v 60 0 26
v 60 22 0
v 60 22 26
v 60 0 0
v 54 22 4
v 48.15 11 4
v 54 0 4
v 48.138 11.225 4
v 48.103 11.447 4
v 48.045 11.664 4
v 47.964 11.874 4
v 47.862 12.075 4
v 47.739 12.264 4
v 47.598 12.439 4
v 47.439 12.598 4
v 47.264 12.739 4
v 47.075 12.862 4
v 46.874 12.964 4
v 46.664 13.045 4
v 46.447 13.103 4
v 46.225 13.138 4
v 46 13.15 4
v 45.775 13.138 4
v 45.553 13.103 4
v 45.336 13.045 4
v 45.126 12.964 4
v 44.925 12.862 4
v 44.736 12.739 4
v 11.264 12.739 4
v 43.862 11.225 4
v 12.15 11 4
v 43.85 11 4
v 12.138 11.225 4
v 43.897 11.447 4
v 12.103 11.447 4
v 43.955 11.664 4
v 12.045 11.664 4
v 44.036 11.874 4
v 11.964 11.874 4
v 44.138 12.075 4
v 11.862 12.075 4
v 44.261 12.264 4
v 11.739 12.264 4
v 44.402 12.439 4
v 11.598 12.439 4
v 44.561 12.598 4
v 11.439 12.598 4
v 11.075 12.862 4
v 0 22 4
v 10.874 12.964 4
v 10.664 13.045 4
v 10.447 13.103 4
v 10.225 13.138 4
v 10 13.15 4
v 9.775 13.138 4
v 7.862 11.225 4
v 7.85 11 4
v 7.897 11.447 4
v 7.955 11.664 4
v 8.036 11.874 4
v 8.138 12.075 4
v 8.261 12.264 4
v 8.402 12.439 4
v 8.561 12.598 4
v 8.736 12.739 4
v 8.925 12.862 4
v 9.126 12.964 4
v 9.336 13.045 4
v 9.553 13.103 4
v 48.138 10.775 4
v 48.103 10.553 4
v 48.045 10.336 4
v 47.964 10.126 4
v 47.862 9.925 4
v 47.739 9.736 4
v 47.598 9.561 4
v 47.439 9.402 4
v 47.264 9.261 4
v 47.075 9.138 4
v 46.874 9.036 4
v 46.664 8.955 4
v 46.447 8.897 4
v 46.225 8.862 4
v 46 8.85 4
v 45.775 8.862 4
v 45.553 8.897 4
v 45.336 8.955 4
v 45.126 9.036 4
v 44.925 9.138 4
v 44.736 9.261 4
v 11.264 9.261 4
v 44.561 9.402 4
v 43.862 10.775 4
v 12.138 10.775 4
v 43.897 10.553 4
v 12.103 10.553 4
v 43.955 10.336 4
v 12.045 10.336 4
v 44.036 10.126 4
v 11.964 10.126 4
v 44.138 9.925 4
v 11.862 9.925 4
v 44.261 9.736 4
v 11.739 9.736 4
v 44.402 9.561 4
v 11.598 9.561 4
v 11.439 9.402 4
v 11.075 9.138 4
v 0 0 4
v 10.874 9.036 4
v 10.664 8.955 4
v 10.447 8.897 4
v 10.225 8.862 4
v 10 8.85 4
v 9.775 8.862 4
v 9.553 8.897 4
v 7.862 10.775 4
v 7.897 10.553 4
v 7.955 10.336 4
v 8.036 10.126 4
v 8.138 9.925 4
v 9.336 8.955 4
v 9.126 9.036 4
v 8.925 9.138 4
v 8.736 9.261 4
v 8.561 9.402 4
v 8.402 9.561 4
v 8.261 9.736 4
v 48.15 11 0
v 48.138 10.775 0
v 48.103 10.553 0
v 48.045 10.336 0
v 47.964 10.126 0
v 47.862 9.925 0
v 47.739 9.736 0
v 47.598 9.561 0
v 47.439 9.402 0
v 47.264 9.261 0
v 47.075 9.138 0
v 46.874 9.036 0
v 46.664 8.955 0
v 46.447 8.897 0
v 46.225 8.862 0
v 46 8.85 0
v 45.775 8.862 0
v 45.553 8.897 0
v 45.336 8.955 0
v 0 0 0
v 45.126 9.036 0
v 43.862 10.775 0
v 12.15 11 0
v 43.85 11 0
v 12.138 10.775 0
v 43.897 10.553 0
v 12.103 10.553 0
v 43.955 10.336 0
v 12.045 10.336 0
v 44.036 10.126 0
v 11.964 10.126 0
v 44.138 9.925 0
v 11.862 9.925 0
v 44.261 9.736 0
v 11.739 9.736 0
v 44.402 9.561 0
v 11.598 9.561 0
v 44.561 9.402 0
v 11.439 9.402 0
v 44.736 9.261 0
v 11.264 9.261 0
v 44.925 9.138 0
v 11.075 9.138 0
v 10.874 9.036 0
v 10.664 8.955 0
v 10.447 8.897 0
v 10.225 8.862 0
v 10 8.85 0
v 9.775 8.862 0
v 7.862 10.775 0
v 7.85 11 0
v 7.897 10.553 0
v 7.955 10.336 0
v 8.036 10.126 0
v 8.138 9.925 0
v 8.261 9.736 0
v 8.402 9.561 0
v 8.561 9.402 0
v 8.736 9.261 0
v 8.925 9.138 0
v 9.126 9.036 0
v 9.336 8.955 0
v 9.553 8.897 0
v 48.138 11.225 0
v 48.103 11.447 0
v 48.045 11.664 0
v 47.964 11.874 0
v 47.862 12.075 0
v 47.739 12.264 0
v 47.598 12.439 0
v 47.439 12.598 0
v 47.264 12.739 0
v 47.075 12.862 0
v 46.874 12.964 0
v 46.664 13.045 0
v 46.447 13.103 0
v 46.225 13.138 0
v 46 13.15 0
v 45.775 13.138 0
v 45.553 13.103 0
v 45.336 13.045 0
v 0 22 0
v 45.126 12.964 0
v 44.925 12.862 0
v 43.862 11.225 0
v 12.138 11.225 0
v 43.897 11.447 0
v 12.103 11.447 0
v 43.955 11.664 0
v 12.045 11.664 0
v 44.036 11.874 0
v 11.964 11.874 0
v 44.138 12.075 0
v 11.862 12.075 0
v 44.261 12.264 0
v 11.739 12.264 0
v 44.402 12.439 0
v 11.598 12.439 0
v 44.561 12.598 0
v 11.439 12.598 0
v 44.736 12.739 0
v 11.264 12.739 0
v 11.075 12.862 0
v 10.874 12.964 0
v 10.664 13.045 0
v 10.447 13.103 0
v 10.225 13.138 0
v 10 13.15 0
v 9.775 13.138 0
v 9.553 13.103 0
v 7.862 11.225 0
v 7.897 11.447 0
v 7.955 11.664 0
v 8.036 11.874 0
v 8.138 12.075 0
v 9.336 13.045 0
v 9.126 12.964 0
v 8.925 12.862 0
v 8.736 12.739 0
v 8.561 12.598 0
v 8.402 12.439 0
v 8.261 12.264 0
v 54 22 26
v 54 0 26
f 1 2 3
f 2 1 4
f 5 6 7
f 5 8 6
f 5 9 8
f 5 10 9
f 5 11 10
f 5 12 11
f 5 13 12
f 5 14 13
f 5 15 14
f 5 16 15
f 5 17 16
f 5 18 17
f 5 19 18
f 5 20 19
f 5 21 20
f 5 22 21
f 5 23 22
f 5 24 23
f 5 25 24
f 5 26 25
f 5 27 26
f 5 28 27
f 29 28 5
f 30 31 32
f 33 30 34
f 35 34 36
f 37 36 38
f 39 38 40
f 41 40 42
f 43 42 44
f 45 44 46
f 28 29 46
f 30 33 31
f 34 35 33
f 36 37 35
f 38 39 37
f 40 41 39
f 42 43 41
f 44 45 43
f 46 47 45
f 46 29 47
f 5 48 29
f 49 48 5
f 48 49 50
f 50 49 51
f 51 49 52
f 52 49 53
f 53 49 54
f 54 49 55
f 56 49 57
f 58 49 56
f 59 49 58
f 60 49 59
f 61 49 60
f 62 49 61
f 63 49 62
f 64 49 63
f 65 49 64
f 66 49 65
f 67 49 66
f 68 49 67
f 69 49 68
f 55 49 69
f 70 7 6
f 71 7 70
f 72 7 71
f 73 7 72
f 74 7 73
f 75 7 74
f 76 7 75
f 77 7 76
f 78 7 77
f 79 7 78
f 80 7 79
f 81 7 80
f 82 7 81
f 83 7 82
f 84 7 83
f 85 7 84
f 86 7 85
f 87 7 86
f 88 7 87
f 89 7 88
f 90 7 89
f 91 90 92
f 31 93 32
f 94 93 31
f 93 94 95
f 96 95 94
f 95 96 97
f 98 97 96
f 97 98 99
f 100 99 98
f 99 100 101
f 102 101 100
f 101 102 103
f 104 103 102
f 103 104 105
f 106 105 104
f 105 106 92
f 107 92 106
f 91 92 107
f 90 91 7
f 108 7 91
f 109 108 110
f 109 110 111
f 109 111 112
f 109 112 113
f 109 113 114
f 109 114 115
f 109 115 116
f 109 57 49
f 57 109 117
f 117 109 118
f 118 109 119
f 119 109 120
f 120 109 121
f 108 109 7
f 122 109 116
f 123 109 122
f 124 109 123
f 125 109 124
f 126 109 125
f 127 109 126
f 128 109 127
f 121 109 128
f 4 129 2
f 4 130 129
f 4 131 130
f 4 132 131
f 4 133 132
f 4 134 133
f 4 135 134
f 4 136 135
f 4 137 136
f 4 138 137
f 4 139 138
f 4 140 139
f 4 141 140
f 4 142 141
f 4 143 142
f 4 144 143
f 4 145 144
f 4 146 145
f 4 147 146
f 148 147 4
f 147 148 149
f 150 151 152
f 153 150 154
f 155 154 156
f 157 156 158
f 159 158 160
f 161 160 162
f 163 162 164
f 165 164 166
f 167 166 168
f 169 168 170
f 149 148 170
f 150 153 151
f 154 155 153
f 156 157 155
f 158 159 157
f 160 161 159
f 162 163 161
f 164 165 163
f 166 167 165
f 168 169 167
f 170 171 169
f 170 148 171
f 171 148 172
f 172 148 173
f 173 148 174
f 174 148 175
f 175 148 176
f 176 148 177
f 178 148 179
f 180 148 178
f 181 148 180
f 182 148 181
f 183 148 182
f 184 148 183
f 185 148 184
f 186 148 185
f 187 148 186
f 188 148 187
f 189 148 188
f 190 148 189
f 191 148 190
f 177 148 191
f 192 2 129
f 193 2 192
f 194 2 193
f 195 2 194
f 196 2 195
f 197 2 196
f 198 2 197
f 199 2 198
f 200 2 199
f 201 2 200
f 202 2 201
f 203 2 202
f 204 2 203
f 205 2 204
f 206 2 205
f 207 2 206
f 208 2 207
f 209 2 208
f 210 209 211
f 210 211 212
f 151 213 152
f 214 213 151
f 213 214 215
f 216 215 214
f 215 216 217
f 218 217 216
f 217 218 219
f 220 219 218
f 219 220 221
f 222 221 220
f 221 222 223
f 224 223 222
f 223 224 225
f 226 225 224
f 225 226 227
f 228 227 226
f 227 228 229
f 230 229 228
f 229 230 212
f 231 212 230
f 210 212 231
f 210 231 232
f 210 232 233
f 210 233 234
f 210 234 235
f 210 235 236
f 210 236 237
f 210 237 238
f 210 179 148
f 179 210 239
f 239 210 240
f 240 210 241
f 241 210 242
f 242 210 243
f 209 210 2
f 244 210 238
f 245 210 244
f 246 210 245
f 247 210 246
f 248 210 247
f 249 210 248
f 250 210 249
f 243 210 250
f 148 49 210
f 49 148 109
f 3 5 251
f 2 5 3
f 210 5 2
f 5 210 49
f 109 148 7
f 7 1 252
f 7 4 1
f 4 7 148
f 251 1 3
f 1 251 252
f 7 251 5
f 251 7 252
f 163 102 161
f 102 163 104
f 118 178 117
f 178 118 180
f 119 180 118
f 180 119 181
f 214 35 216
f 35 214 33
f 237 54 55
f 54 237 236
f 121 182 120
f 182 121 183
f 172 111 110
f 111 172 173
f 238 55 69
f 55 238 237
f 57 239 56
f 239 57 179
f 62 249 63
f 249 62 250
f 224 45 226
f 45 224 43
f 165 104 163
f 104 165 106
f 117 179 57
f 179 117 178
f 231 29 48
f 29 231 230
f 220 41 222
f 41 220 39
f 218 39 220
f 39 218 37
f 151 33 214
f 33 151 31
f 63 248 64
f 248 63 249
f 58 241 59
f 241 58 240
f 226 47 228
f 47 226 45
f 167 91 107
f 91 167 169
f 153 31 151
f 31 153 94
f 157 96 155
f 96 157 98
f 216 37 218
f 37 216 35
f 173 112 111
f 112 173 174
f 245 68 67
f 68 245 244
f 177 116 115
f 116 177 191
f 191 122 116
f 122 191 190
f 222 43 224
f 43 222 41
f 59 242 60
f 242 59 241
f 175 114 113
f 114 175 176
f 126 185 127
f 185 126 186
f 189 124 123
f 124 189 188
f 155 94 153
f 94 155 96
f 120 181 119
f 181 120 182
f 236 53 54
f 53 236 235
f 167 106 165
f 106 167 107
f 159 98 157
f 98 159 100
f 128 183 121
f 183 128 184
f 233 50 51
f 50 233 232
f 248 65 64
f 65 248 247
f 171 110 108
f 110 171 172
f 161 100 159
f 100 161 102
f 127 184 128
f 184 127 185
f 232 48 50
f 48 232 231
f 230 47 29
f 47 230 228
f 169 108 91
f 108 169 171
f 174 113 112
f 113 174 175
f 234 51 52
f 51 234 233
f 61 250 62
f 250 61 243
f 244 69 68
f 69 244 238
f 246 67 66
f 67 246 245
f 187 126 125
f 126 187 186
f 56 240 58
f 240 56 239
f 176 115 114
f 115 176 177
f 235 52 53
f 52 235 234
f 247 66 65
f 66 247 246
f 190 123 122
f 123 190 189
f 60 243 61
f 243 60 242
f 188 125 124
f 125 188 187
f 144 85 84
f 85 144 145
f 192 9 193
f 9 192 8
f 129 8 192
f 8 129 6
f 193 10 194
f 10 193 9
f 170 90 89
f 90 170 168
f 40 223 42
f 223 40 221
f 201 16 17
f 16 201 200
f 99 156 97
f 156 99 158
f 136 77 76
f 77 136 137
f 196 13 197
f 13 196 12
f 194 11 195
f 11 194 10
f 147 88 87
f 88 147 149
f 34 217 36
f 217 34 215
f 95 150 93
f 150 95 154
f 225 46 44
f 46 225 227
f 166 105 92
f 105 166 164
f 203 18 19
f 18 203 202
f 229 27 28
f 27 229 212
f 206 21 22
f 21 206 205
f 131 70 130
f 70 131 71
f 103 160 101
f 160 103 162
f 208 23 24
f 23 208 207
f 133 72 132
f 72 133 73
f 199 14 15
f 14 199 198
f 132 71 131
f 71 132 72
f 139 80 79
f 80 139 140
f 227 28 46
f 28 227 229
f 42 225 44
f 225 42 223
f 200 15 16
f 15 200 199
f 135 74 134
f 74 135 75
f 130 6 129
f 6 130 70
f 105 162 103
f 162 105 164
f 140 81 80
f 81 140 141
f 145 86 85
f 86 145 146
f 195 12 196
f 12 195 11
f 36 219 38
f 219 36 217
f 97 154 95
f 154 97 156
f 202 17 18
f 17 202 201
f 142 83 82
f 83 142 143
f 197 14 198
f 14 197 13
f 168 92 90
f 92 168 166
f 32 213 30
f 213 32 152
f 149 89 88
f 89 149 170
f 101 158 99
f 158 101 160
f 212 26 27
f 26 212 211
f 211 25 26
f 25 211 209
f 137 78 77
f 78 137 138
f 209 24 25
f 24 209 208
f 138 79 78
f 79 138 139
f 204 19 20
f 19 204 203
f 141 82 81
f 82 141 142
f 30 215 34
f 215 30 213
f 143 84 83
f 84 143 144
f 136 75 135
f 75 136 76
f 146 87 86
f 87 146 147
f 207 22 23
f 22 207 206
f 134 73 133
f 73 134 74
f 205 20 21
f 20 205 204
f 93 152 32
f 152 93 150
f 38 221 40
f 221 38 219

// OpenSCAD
// Latch catch plate.
$fn = 60;
eps = 0.02;
length = 60;
height = 22;
width = 22;
thickness = 4;
difference() {
    union() { cube([length,width,thickness]); translate([length-6,0,thickness]) cube([6,width,height]); }
    for(x=[10,length-14]) translate([x,width/2,-eps]) cylinder(d=4.3,h=thickness+2*eps);
}
